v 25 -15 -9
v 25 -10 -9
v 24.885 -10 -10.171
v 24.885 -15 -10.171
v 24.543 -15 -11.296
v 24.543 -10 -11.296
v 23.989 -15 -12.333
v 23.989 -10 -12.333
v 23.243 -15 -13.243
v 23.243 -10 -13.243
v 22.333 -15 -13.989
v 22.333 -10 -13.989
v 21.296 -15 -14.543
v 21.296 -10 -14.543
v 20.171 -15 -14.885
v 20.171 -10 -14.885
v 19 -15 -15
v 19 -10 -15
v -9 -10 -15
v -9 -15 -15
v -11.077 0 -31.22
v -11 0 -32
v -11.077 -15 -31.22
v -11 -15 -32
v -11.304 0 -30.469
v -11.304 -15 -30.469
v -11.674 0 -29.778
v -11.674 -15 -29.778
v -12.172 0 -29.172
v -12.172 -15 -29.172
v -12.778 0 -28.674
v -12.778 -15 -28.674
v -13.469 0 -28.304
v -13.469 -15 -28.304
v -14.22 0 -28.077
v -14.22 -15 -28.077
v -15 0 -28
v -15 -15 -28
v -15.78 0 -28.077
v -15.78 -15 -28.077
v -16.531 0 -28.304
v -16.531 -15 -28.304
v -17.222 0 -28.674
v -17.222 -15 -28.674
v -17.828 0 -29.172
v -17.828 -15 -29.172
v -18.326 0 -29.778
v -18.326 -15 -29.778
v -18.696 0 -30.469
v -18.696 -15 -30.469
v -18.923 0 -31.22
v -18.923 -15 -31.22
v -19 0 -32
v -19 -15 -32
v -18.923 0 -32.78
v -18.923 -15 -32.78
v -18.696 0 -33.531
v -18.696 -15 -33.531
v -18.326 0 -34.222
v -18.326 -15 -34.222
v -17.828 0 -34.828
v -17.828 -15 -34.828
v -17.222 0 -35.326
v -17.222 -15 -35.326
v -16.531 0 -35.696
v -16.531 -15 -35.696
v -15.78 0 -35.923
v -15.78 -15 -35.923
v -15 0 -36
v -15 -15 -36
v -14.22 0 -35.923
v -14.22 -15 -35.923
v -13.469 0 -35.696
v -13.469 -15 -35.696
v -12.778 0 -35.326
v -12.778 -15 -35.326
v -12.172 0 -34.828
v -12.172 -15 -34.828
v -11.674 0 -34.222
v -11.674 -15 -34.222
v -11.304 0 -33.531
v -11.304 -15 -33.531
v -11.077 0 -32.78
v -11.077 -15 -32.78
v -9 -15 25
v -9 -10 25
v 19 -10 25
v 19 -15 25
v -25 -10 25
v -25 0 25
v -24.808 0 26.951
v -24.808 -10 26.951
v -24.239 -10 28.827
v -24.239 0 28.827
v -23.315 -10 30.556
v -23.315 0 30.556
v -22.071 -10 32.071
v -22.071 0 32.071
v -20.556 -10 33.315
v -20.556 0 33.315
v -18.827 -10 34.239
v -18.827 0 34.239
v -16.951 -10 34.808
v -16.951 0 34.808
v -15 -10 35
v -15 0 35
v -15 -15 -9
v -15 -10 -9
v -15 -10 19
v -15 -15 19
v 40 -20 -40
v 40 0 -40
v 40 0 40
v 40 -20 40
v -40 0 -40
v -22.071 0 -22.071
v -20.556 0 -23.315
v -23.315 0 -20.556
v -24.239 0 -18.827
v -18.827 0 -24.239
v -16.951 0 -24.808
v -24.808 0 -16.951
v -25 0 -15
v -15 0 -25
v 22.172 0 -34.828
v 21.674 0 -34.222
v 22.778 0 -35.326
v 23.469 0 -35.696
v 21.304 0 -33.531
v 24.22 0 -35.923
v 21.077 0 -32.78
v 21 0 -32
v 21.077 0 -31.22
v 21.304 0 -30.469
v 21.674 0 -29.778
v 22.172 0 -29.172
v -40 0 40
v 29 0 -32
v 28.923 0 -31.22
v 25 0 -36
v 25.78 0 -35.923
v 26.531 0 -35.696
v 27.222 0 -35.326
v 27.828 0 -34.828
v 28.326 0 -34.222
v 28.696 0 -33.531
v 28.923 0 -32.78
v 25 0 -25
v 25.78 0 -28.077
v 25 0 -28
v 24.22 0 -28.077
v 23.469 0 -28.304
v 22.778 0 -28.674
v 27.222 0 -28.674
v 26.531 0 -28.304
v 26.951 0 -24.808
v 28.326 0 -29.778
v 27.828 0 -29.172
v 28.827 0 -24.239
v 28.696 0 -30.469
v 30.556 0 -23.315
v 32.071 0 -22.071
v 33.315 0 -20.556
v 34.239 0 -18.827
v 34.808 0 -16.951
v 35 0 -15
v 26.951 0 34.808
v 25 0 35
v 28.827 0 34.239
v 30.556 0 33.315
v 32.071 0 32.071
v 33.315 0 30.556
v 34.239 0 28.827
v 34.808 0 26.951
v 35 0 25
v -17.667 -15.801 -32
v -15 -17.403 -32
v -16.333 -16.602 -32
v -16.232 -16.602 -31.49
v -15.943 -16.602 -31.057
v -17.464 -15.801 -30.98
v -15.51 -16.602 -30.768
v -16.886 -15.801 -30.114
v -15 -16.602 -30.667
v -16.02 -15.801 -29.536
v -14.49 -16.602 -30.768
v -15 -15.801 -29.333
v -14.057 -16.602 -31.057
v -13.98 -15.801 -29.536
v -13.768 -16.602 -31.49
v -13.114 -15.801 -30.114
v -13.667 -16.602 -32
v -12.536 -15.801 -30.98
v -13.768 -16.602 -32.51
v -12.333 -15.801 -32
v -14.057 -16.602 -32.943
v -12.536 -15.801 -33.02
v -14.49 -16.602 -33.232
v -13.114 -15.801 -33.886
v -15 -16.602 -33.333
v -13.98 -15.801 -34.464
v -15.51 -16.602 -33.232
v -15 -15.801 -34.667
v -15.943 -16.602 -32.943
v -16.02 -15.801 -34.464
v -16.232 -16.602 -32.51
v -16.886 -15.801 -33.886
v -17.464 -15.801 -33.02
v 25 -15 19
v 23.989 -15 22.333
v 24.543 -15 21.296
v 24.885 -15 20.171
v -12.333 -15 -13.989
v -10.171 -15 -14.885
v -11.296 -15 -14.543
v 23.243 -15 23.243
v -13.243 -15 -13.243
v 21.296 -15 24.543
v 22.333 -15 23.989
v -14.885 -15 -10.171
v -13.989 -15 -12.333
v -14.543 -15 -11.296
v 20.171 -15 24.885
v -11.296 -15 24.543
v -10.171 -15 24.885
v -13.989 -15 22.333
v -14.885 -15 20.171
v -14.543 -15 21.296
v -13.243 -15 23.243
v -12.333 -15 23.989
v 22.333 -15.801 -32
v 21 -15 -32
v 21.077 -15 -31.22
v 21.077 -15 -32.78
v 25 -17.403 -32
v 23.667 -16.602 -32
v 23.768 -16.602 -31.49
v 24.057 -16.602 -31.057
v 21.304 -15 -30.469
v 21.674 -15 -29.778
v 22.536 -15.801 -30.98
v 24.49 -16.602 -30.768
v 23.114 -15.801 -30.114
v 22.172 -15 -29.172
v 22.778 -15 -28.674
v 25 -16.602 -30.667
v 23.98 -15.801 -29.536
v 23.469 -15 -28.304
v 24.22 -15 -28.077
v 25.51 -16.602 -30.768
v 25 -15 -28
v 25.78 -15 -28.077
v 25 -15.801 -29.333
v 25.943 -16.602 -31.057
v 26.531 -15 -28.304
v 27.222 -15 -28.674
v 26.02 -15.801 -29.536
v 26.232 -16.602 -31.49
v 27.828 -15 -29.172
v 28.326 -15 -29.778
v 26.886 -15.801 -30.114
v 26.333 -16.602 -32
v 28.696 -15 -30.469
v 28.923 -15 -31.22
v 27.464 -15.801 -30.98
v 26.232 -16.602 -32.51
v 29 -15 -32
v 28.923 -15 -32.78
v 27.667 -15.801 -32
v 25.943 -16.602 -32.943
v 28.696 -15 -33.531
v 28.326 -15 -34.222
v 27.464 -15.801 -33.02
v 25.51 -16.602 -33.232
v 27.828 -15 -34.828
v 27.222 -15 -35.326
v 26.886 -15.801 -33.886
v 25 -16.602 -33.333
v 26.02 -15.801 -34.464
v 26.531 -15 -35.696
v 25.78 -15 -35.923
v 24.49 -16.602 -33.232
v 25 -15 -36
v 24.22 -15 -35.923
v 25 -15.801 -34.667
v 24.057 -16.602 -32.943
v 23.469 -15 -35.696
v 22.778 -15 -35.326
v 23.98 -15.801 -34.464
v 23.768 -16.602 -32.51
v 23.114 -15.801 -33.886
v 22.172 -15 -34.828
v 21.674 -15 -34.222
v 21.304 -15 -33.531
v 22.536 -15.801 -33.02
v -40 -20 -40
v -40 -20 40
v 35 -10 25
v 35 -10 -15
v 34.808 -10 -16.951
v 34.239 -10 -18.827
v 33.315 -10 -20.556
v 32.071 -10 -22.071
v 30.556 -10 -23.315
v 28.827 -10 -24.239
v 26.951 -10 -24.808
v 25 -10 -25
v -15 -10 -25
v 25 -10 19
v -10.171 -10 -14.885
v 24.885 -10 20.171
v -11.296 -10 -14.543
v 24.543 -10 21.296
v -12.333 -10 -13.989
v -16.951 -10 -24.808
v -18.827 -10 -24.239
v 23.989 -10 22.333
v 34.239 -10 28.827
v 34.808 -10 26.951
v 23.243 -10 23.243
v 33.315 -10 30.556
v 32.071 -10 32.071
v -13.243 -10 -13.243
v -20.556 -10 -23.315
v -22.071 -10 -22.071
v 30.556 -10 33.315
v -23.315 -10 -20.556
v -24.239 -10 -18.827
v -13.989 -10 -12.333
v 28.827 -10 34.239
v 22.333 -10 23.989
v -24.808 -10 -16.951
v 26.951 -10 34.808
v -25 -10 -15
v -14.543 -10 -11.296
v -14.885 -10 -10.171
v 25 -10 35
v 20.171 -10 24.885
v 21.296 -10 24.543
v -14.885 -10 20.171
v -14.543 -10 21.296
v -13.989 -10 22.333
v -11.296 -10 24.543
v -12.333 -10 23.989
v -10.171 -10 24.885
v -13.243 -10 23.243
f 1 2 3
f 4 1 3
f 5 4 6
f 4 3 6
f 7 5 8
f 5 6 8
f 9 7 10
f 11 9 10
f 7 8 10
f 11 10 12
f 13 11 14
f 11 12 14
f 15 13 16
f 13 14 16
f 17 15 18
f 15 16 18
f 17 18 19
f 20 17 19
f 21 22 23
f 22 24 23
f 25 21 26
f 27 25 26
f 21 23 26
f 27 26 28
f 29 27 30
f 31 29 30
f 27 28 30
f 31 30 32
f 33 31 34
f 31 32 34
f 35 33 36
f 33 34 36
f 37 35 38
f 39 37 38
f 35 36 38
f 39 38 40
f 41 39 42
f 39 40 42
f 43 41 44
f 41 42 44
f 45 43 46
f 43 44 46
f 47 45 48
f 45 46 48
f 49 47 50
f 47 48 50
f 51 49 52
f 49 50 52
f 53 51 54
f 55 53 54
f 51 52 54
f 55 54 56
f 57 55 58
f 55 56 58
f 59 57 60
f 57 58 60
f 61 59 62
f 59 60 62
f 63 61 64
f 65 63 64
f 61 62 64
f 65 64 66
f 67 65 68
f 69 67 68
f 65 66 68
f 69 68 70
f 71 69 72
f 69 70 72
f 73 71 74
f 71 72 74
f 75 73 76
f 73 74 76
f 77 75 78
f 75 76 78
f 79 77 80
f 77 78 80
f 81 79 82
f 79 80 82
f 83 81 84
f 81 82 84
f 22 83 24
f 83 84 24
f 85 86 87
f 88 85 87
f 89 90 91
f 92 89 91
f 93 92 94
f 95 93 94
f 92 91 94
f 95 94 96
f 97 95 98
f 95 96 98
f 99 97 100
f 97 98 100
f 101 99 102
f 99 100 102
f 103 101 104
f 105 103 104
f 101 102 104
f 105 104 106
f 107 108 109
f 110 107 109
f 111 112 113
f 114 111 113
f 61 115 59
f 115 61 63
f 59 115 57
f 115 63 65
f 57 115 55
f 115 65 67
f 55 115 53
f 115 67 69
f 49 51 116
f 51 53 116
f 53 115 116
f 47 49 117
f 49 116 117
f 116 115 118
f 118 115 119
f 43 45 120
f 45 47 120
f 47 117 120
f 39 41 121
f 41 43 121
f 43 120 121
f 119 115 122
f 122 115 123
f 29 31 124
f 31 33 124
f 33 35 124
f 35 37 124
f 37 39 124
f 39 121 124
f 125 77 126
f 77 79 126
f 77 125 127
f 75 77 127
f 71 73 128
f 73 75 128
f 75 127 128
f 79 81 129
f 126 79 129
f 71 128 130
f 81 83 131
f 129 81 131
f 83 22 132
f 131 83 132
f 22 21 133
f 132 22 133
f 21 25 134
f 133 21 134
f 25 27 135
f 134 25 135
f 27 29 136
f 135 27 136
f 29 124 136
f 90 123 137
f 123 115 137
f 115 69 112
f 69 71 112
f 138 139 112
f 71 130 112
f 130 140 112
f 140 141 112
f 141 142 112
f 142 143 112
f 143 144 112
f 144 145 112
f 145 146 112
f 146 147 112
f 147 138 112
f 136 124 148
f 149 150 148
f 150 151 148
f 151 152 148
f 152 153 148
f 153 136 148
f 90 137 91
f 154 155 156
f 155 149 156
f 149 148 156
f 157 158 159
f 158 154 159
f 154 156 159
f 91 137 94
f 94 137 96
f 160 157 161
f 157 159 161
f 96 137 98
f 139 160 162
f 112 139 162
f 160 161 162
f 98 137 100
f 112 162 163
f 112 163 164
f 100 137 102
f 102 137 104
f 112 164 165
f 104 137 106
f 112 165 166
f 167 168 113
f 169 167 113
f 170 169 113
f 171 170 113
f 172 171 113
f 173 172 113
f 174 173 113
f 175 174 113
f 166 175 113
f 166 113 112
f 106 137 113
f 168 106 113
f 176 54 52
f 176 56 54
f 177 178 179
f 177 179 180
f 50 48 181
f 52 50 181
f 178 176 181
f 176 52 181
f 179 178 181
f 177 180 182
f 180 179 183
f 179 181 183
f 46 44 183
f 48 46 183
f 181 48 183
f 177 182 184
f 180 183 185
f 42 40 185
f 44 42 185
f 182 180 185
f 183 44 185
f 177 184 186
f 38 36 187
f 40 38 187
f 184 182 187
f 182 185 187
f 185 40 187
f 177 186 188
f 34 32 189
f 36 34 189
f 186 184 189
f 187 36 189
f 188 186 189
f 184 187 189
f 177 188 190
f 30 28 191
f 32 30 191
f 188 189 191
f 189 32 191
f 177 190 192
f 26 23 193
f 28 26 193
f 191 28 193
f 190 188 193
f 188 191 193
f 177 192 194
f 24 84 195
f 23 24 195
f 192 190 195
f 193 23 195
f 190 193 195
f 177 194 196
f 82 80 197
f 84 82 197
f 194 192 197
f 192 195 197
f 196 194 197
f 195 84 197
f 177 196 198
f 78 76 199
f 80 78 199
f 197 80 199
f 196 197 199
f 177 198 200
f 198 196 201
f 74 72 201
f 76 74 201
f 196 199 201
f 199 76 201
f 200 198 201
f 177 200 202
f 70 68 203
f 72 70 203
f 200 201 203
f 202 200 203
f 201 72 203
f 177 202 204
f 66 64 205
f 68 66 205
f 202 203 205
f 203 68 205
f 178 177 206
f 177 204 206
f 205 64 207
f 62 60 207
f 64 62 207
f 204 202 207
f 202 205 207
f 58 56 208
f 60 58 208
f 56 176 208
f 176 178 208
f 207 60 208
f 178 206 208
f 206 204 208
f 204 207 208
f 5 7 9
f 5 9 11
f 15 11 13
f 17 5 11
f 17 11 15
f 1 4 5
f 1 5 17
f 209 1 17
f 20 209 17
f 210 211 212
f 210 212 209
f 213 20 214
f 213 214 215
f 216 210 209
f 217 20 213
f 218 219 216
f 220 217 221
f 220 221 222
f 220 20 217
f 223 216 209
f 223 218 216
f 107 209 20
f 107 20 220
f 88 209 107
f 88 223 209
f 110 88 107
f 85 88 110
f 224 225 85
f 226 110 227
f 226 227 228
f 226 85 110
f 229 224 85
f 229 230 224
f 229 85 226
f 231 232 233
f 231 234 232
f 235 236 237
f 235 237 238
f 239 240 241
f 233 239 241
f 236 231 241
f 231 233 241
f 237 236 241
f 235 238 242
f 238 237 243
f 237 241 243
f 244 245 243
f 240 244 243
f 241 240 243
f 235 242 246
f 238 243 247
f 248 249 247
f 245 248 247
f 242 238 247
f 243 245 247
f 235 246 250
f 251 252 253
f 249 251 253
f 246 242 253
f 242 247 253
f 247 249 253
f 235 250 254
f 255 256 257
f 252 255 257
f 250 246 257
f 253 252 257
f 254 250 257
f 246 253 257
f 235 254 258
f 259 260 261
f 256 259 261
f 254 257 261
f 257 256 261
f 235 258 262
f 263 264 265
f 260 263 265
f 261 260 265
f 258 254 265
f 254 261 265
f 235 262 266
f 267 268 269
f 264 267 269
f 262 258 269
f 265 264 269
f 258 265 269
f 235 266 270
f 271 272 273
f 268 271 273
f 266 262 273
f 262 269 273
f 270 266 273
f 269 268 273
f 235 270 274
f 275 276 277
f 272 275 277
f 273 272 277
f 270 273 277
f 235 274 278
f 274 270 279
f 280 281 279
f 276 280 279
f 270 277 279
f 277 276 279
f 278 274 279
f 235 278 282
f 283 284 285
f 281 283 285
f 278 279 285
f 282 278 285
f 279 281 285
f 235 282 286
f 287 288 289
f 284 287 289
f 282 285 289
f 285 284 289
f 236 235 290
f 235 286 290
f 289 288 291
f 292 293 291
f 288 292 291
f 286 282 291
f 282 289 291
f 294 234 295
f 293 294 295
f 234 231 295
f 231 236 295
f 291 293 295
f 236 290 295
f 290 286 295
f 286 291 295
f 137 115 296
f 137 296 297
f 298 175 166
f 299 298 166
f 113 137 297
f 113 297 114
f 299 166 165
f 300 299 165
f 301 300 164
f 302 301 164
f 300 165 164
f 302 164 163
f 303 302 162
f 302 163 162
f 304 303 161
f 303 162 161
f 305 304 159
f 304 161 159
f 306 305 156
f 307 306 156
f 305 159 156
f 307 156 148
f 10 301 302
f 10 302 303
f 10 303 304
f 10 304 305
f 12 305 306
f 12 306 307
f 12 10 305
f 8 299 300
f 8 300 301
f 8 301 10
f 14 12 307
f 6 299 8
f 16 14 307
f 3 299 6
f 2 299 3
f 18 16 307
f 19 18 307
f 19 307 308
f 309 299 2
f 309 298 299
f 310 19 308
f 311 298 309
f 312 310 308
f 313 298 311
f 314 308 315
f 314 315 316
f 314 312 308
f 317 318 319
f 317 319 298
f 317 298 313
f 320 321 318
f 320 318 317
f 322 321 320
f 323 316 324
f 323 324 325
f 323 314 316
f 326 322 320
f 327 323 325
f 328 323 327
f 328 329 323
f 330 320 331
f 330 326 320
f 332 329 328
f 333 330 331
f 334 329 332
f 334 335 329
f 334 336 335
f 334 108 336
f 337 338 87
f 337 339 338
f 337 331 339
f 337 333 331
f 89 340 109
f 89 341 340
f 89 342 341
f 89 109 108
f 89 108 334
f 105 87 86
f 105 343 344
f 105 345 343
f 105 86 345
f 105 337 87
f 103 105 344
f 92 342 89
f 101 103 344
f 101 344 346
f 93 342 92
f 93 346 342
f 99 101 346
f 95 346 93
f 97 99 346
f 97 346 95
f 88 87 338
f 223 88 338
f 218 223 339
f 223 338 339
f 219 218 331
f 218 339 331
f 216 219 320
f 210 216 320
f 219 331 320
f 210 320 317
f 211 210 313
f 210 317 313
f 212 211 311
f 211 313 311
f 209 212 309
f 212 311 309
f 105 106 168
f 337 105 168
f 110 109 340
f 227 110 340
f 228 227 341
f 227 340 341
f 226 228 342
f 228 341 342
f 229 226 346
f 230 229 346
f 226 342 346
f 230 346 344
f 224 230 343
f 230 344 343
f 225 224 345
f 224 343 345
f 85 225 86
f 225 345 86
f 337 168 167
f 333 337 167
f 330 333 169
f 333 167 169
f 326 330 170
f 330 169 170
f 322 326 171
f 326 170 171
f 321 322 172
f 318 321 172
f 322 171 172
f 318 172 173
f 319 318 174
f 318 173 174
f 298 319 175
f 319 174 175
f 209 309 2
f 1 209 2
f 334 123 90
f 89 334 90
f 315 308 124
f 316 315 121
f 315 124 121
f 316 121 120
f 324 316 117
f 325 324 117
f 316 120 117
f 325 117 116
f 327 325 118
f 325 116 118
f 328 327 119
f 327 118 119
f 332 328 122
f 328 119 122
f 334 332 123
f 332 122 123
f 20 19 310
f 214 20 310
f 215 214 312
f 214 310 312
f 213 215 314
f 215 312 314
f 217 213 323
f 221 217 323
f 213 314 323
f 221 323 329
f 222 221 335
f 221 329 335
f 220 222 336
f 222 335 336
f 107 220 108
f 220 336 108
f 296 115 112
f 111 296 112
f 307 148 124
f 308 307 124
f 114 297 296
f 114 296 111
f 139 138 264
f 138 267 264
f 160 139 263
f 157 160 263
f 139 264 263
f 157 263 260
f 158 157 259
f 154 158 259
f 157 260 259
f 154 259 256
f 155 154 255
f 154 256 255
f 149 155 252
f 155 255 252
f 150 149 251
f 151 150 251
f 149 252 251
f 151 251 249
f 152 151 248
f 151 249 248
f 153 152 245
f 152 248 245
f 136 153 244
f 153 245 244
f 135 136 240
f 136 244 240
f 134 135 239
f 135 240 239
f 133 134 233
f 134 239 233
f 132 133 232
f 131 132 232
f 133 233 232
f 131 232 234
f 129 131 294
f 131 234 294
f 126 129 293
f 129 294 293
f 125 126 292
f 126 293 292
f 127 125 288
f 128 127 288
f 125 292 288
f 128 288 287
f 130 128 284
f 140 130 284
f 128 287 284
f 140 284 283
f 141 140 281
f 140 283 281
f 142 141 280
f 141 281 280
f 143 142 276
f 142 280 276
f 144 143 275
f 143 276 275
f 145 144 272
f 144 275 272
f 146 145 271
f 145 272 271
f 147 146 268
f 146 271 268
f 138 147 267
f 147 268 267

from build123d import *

# Parameters (mm, degrees)
F0_W     = 80
F0_H     = 80
F1_DEPTH = 20
F3_D     = 8
F3_DEPTH = 15
F3_TIP   = 2.4034424761
F5_DEPTH = 10
F7_DEPTH = 5


with BuildPart() as f1:
    # F0 (on Front) → F1 (new body)
    with BuildSketch(Plane.XZ):
        Rectangle(F0_W, F0_H)
    extrude(amount=F1_DEPTH)

    # F3
    with Locations(Plane(origin=(0, 0, 0), x_dir=(-1, 0, 0), z_dir=(0, 1, 0))):
        with Locations((-25, -32), (15, -32)):
            Hole(F3_D / 2, depth=F3_DEPTH)
            with Locations((0, 0, -(F3_DEPTH + F3_TIP / 2))):  # 118° drill point
                Cone(0, F3_D / 2, F3_TIP, mode=Mode.SUBTRACT)

    # F4 (on face) → F5 (cut)
    with BuildSketch(Plane(origin=(0, 0, 0), x_dir=(-1, 0, 0), z_dir=(0, 1, 0))):
        with BuildLine():
            ThreePointArc((25, 25), (22.0710678119, 32.0710678119), (15, 35))
            Line((15, 35), (-25, 35))
            ThreePointArc((-25, 35), (-32.0710678119, 32.0710678119), (-35, 25))
            Line((-35, 25), (-35, -15))
            ThreePointArc((-35, -15), (-32.0710678119, -22.0710678119), (-25, -25))
            Line((-25, -25), (15, -25))
            ThreePointArc((15, -25), (22.0710678119, -22.0710678119), (25, -15))
            Line((25, -15), (25, 25))
        make_face()
    extrude(amount=-F5_DEPTH, mode=Mode.SUBTRACT)

    # F6 (on face) → F7 (cut)
    with BuildSketch(Plane(origin=(0, -10, 0), x_dir=(-1, 0, 0), z_dir=(0, 1, 0))):
        with BuildLine():
            ThreePointArc((-25, -9), (-23.2426406871, -13.2426406871), (-19, -15))
            Line((-19, -15), (9, -15))
            ThreePointArc((9, -15), (13.2426406871, -13.2426406871), (15, -9))
            Line((15, -9), (15, 19))
            ThreePointArc((15, 19), (13.2426406871, 23.2426406871), (9, 25))
            Line((9, 25), (-19, 25))
            ThreePointArc((-19, 25), (-23.2426406871, 23.2426406871), (-25, 19))
            Line((-25, 19), (-25, -9))
        make_face()
    extrude(amount=-F7_DEPTH, mode=Mode.SUBTRACT)


solid = f1.part
